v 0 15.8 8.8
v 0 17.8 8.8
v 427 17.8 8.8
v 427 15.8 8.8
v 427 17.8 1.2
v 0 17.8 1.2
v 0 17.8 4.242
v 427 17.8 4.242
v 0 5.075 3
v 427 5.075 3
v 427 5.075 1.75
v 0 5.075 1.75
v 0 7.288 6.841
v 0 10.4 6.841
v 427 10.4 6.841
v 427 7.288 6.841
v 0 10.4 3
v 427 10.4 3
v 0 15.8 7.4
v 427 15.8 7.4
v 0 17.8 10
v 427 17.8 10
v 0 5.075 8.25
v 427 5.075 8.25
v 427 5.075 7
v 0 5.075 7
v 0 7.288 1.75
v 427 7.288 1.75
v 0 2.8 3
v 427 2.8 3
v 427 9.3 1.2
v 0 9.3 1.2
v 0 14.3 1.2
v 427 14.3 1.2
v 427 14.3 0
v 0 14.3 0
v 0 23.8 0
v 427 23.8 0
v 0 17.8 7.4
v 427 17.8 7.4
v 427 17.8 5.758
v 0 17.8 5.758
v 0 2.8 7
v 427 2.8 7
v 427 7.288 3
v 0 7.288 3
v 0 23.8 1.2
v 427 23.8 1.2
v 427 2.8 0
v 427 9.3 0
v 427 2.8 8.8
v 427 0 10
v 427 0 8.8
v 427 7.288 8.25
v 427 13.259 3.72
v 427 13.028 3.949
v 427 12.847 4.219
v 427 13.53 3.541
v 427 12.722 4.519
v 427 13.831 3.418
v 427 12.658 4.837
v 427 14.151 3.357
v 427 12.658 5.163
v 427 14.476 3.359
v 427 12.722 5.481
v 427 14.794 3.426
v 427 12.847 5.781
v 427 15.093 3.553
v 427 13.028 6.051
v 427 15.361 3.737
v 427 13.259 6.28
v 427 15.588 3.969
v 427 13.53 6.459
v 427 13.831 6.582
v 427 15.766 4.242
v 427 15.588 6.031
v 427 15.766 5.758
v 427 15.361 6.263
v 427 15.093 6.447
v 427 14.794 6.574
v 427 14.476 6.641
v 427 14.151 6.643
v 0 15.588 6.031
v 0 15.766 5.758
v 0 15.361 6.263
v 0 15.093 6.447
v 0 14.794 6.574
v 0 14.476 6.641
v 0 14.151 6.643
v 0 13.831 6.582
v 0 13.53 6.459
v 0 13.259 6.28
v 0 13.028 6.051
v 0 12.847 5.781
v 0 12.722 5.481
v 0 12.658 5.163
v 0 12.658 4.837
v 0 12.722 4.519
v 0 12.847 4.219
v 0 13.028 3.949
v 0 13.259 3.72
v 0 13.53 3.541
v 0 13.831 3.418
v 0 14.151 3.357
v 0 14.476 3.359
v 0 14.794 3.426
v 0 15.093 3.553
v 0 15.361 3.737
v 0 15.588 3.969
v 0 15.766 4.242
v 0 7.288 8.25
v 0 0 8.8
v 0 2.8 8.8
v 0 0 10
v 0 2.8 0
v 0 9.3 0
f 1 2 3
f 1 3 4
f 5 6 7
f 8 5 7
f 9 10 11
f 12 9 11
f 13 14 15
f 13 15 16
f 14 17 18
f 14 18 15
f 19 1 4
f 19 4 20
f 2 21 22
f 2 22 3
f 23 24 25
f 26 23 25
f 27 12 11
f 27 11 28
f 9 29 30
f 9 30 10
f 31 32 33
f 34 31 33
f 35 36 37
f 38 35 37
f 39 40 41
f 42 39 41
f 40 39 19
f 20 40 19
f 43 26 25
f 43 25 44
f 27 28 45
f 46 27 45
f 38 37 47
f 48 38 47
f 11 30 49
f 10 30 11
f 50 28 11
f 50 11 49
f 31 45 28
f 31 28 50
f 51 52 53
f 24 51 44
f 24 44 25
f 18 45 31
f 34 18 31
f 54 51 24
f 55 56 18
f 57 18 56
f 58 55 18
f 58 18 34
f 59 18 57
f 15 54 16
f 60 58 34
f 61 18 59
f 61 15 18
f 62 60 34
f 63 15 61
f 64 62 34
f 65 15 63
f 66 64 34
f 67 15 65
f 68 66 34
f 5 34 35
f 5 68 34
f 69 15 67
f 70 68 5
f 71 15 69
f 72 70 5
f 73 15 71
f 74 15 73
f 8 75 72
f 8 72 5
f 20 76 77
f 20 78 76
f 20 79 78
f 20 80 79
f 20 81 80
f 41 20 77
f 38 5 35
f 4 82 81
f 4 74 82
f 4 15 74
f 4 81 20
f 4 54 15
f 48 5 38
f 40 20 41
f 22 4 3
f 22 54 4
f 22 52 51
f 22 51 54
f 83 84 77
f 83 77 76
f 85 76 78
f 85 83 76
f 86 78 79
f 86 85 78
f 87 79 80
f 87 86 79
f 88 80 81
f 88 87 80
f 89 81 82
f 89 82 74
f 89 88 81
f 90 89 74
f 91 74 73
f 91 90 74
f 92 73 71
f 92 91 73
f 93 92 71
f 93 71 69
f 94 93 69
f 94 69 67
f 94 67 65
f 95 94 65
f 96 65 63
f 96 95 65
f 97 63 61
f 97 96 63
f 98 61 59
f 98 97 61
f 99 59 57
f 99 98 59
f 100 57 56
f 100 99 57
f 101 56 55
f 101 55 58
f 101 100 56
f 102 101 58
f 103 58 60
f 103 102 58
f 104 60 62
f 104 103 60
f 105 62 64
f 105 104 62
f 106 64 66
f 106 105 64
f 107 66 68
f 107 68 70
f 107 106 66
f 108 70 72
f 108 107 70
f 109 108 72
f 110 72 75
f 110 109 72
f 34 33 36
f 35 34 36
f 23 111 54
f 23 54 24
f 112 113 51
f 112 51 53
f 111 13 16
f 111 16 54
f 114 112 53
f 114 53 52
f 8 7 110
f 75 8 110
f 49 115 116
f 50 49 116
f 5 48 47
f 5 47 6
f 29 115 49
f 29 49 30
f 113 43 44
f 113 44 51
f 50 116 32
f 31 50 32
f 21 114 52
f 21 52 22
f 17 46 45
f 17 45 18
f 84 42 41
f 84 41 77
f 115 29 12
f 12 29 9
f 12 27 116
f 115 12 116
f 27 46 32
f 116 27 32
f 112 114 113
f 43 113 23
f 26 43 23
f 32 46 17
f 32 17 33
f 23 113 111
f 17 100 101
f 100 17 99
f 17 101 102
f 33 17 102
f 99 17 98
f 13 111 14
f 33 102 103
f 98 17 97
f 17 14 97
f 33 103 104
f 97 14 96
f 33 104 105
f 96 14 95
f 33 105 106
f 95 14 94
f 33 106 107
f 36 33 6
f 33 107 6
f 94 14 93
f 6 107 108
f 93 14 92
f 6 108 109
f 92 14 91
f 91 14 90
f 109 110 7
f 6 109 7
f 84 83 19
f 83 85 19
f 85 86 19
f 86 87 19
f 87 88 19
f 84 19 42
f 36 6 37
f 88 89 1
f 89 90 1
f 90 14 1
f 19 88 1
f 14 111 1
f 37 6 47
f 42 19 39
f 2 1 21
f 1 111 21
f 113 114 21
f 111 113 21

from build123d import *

# Parameters (mm, degrees)
PAD_DEPTH = 427


with BuildPart() as part:
    # Sketch → Pad (new body)
    with BuildSketch(Plane.YZ):
        with BuildLine():
            Line((2.8, 0), (9.3, 0))
            Line((9.3, 0), (9.3, 1.2))
            Line((9.3, 1.2), (14.3, 1.2))
            Line((14.3, 1.2), (14.3, 0))
            Line((14.3, 0), (23.8, 0))
            Line((23.8, 0), (23.8, 1.2))
            Line((23.8, 1.2), (17.8, 1.2))
            Line((17.8, 1.2), (17.8, 4.241981))
            Line((17.8, 4.241981), (15.765574, 4.241981))
            ThreePointArc((15.765574, 5.758019), (12.65, 5), (15.765574, 4.241981))
            Line((17.8, 5.758019), (15.765574, 5.758019))
            Line((17.8, 7.4), (17.8, 5.758019))
            Line((17.8, 7.4), (15.8, 7.4))
            Line((15.8, 8.8), (15.8, 7.4))
            Line((17.8, 8.8), (15.8, 8.8))
            Line((17.8, 10), (17.8, 8.8))
            Line((0, 10), (17.8, 10))
            Line((0, 8.8), (0, 10))
            Line((2.8, 8.8), (0, 8.8))
            Line((2.8, 7), (2.8, 8.8))
            Line((5.075313, 7), (2.8, 7))
            Line((5.075313, 8.25), (5.075313, 7))
            Line((7.288366, 8.25), (5.075313, 8.25))
            Line((7.288366, 6.841252), (7.288366, 8.25))
            Line((10.4, 6.841252), (7.288366, 6.841252))
            Line((10.4, 3), (10.4, 6.841252))
            Line((7.288366, 3), (10.4, 3))
            Line((7.288366, 1.75), (7.288366, 3))
            Line((5.075313, 1.75), (7.288366, 1.75))
            Line((5.075313, 3), (5.075313, 1.75))
            Line((2.8, 3), (5.075313, 3))
            Line((2.8, 0), (2.8, 3))
        make_face()
    extrude(amount=PAD_DEPTH)


solid = part.part
